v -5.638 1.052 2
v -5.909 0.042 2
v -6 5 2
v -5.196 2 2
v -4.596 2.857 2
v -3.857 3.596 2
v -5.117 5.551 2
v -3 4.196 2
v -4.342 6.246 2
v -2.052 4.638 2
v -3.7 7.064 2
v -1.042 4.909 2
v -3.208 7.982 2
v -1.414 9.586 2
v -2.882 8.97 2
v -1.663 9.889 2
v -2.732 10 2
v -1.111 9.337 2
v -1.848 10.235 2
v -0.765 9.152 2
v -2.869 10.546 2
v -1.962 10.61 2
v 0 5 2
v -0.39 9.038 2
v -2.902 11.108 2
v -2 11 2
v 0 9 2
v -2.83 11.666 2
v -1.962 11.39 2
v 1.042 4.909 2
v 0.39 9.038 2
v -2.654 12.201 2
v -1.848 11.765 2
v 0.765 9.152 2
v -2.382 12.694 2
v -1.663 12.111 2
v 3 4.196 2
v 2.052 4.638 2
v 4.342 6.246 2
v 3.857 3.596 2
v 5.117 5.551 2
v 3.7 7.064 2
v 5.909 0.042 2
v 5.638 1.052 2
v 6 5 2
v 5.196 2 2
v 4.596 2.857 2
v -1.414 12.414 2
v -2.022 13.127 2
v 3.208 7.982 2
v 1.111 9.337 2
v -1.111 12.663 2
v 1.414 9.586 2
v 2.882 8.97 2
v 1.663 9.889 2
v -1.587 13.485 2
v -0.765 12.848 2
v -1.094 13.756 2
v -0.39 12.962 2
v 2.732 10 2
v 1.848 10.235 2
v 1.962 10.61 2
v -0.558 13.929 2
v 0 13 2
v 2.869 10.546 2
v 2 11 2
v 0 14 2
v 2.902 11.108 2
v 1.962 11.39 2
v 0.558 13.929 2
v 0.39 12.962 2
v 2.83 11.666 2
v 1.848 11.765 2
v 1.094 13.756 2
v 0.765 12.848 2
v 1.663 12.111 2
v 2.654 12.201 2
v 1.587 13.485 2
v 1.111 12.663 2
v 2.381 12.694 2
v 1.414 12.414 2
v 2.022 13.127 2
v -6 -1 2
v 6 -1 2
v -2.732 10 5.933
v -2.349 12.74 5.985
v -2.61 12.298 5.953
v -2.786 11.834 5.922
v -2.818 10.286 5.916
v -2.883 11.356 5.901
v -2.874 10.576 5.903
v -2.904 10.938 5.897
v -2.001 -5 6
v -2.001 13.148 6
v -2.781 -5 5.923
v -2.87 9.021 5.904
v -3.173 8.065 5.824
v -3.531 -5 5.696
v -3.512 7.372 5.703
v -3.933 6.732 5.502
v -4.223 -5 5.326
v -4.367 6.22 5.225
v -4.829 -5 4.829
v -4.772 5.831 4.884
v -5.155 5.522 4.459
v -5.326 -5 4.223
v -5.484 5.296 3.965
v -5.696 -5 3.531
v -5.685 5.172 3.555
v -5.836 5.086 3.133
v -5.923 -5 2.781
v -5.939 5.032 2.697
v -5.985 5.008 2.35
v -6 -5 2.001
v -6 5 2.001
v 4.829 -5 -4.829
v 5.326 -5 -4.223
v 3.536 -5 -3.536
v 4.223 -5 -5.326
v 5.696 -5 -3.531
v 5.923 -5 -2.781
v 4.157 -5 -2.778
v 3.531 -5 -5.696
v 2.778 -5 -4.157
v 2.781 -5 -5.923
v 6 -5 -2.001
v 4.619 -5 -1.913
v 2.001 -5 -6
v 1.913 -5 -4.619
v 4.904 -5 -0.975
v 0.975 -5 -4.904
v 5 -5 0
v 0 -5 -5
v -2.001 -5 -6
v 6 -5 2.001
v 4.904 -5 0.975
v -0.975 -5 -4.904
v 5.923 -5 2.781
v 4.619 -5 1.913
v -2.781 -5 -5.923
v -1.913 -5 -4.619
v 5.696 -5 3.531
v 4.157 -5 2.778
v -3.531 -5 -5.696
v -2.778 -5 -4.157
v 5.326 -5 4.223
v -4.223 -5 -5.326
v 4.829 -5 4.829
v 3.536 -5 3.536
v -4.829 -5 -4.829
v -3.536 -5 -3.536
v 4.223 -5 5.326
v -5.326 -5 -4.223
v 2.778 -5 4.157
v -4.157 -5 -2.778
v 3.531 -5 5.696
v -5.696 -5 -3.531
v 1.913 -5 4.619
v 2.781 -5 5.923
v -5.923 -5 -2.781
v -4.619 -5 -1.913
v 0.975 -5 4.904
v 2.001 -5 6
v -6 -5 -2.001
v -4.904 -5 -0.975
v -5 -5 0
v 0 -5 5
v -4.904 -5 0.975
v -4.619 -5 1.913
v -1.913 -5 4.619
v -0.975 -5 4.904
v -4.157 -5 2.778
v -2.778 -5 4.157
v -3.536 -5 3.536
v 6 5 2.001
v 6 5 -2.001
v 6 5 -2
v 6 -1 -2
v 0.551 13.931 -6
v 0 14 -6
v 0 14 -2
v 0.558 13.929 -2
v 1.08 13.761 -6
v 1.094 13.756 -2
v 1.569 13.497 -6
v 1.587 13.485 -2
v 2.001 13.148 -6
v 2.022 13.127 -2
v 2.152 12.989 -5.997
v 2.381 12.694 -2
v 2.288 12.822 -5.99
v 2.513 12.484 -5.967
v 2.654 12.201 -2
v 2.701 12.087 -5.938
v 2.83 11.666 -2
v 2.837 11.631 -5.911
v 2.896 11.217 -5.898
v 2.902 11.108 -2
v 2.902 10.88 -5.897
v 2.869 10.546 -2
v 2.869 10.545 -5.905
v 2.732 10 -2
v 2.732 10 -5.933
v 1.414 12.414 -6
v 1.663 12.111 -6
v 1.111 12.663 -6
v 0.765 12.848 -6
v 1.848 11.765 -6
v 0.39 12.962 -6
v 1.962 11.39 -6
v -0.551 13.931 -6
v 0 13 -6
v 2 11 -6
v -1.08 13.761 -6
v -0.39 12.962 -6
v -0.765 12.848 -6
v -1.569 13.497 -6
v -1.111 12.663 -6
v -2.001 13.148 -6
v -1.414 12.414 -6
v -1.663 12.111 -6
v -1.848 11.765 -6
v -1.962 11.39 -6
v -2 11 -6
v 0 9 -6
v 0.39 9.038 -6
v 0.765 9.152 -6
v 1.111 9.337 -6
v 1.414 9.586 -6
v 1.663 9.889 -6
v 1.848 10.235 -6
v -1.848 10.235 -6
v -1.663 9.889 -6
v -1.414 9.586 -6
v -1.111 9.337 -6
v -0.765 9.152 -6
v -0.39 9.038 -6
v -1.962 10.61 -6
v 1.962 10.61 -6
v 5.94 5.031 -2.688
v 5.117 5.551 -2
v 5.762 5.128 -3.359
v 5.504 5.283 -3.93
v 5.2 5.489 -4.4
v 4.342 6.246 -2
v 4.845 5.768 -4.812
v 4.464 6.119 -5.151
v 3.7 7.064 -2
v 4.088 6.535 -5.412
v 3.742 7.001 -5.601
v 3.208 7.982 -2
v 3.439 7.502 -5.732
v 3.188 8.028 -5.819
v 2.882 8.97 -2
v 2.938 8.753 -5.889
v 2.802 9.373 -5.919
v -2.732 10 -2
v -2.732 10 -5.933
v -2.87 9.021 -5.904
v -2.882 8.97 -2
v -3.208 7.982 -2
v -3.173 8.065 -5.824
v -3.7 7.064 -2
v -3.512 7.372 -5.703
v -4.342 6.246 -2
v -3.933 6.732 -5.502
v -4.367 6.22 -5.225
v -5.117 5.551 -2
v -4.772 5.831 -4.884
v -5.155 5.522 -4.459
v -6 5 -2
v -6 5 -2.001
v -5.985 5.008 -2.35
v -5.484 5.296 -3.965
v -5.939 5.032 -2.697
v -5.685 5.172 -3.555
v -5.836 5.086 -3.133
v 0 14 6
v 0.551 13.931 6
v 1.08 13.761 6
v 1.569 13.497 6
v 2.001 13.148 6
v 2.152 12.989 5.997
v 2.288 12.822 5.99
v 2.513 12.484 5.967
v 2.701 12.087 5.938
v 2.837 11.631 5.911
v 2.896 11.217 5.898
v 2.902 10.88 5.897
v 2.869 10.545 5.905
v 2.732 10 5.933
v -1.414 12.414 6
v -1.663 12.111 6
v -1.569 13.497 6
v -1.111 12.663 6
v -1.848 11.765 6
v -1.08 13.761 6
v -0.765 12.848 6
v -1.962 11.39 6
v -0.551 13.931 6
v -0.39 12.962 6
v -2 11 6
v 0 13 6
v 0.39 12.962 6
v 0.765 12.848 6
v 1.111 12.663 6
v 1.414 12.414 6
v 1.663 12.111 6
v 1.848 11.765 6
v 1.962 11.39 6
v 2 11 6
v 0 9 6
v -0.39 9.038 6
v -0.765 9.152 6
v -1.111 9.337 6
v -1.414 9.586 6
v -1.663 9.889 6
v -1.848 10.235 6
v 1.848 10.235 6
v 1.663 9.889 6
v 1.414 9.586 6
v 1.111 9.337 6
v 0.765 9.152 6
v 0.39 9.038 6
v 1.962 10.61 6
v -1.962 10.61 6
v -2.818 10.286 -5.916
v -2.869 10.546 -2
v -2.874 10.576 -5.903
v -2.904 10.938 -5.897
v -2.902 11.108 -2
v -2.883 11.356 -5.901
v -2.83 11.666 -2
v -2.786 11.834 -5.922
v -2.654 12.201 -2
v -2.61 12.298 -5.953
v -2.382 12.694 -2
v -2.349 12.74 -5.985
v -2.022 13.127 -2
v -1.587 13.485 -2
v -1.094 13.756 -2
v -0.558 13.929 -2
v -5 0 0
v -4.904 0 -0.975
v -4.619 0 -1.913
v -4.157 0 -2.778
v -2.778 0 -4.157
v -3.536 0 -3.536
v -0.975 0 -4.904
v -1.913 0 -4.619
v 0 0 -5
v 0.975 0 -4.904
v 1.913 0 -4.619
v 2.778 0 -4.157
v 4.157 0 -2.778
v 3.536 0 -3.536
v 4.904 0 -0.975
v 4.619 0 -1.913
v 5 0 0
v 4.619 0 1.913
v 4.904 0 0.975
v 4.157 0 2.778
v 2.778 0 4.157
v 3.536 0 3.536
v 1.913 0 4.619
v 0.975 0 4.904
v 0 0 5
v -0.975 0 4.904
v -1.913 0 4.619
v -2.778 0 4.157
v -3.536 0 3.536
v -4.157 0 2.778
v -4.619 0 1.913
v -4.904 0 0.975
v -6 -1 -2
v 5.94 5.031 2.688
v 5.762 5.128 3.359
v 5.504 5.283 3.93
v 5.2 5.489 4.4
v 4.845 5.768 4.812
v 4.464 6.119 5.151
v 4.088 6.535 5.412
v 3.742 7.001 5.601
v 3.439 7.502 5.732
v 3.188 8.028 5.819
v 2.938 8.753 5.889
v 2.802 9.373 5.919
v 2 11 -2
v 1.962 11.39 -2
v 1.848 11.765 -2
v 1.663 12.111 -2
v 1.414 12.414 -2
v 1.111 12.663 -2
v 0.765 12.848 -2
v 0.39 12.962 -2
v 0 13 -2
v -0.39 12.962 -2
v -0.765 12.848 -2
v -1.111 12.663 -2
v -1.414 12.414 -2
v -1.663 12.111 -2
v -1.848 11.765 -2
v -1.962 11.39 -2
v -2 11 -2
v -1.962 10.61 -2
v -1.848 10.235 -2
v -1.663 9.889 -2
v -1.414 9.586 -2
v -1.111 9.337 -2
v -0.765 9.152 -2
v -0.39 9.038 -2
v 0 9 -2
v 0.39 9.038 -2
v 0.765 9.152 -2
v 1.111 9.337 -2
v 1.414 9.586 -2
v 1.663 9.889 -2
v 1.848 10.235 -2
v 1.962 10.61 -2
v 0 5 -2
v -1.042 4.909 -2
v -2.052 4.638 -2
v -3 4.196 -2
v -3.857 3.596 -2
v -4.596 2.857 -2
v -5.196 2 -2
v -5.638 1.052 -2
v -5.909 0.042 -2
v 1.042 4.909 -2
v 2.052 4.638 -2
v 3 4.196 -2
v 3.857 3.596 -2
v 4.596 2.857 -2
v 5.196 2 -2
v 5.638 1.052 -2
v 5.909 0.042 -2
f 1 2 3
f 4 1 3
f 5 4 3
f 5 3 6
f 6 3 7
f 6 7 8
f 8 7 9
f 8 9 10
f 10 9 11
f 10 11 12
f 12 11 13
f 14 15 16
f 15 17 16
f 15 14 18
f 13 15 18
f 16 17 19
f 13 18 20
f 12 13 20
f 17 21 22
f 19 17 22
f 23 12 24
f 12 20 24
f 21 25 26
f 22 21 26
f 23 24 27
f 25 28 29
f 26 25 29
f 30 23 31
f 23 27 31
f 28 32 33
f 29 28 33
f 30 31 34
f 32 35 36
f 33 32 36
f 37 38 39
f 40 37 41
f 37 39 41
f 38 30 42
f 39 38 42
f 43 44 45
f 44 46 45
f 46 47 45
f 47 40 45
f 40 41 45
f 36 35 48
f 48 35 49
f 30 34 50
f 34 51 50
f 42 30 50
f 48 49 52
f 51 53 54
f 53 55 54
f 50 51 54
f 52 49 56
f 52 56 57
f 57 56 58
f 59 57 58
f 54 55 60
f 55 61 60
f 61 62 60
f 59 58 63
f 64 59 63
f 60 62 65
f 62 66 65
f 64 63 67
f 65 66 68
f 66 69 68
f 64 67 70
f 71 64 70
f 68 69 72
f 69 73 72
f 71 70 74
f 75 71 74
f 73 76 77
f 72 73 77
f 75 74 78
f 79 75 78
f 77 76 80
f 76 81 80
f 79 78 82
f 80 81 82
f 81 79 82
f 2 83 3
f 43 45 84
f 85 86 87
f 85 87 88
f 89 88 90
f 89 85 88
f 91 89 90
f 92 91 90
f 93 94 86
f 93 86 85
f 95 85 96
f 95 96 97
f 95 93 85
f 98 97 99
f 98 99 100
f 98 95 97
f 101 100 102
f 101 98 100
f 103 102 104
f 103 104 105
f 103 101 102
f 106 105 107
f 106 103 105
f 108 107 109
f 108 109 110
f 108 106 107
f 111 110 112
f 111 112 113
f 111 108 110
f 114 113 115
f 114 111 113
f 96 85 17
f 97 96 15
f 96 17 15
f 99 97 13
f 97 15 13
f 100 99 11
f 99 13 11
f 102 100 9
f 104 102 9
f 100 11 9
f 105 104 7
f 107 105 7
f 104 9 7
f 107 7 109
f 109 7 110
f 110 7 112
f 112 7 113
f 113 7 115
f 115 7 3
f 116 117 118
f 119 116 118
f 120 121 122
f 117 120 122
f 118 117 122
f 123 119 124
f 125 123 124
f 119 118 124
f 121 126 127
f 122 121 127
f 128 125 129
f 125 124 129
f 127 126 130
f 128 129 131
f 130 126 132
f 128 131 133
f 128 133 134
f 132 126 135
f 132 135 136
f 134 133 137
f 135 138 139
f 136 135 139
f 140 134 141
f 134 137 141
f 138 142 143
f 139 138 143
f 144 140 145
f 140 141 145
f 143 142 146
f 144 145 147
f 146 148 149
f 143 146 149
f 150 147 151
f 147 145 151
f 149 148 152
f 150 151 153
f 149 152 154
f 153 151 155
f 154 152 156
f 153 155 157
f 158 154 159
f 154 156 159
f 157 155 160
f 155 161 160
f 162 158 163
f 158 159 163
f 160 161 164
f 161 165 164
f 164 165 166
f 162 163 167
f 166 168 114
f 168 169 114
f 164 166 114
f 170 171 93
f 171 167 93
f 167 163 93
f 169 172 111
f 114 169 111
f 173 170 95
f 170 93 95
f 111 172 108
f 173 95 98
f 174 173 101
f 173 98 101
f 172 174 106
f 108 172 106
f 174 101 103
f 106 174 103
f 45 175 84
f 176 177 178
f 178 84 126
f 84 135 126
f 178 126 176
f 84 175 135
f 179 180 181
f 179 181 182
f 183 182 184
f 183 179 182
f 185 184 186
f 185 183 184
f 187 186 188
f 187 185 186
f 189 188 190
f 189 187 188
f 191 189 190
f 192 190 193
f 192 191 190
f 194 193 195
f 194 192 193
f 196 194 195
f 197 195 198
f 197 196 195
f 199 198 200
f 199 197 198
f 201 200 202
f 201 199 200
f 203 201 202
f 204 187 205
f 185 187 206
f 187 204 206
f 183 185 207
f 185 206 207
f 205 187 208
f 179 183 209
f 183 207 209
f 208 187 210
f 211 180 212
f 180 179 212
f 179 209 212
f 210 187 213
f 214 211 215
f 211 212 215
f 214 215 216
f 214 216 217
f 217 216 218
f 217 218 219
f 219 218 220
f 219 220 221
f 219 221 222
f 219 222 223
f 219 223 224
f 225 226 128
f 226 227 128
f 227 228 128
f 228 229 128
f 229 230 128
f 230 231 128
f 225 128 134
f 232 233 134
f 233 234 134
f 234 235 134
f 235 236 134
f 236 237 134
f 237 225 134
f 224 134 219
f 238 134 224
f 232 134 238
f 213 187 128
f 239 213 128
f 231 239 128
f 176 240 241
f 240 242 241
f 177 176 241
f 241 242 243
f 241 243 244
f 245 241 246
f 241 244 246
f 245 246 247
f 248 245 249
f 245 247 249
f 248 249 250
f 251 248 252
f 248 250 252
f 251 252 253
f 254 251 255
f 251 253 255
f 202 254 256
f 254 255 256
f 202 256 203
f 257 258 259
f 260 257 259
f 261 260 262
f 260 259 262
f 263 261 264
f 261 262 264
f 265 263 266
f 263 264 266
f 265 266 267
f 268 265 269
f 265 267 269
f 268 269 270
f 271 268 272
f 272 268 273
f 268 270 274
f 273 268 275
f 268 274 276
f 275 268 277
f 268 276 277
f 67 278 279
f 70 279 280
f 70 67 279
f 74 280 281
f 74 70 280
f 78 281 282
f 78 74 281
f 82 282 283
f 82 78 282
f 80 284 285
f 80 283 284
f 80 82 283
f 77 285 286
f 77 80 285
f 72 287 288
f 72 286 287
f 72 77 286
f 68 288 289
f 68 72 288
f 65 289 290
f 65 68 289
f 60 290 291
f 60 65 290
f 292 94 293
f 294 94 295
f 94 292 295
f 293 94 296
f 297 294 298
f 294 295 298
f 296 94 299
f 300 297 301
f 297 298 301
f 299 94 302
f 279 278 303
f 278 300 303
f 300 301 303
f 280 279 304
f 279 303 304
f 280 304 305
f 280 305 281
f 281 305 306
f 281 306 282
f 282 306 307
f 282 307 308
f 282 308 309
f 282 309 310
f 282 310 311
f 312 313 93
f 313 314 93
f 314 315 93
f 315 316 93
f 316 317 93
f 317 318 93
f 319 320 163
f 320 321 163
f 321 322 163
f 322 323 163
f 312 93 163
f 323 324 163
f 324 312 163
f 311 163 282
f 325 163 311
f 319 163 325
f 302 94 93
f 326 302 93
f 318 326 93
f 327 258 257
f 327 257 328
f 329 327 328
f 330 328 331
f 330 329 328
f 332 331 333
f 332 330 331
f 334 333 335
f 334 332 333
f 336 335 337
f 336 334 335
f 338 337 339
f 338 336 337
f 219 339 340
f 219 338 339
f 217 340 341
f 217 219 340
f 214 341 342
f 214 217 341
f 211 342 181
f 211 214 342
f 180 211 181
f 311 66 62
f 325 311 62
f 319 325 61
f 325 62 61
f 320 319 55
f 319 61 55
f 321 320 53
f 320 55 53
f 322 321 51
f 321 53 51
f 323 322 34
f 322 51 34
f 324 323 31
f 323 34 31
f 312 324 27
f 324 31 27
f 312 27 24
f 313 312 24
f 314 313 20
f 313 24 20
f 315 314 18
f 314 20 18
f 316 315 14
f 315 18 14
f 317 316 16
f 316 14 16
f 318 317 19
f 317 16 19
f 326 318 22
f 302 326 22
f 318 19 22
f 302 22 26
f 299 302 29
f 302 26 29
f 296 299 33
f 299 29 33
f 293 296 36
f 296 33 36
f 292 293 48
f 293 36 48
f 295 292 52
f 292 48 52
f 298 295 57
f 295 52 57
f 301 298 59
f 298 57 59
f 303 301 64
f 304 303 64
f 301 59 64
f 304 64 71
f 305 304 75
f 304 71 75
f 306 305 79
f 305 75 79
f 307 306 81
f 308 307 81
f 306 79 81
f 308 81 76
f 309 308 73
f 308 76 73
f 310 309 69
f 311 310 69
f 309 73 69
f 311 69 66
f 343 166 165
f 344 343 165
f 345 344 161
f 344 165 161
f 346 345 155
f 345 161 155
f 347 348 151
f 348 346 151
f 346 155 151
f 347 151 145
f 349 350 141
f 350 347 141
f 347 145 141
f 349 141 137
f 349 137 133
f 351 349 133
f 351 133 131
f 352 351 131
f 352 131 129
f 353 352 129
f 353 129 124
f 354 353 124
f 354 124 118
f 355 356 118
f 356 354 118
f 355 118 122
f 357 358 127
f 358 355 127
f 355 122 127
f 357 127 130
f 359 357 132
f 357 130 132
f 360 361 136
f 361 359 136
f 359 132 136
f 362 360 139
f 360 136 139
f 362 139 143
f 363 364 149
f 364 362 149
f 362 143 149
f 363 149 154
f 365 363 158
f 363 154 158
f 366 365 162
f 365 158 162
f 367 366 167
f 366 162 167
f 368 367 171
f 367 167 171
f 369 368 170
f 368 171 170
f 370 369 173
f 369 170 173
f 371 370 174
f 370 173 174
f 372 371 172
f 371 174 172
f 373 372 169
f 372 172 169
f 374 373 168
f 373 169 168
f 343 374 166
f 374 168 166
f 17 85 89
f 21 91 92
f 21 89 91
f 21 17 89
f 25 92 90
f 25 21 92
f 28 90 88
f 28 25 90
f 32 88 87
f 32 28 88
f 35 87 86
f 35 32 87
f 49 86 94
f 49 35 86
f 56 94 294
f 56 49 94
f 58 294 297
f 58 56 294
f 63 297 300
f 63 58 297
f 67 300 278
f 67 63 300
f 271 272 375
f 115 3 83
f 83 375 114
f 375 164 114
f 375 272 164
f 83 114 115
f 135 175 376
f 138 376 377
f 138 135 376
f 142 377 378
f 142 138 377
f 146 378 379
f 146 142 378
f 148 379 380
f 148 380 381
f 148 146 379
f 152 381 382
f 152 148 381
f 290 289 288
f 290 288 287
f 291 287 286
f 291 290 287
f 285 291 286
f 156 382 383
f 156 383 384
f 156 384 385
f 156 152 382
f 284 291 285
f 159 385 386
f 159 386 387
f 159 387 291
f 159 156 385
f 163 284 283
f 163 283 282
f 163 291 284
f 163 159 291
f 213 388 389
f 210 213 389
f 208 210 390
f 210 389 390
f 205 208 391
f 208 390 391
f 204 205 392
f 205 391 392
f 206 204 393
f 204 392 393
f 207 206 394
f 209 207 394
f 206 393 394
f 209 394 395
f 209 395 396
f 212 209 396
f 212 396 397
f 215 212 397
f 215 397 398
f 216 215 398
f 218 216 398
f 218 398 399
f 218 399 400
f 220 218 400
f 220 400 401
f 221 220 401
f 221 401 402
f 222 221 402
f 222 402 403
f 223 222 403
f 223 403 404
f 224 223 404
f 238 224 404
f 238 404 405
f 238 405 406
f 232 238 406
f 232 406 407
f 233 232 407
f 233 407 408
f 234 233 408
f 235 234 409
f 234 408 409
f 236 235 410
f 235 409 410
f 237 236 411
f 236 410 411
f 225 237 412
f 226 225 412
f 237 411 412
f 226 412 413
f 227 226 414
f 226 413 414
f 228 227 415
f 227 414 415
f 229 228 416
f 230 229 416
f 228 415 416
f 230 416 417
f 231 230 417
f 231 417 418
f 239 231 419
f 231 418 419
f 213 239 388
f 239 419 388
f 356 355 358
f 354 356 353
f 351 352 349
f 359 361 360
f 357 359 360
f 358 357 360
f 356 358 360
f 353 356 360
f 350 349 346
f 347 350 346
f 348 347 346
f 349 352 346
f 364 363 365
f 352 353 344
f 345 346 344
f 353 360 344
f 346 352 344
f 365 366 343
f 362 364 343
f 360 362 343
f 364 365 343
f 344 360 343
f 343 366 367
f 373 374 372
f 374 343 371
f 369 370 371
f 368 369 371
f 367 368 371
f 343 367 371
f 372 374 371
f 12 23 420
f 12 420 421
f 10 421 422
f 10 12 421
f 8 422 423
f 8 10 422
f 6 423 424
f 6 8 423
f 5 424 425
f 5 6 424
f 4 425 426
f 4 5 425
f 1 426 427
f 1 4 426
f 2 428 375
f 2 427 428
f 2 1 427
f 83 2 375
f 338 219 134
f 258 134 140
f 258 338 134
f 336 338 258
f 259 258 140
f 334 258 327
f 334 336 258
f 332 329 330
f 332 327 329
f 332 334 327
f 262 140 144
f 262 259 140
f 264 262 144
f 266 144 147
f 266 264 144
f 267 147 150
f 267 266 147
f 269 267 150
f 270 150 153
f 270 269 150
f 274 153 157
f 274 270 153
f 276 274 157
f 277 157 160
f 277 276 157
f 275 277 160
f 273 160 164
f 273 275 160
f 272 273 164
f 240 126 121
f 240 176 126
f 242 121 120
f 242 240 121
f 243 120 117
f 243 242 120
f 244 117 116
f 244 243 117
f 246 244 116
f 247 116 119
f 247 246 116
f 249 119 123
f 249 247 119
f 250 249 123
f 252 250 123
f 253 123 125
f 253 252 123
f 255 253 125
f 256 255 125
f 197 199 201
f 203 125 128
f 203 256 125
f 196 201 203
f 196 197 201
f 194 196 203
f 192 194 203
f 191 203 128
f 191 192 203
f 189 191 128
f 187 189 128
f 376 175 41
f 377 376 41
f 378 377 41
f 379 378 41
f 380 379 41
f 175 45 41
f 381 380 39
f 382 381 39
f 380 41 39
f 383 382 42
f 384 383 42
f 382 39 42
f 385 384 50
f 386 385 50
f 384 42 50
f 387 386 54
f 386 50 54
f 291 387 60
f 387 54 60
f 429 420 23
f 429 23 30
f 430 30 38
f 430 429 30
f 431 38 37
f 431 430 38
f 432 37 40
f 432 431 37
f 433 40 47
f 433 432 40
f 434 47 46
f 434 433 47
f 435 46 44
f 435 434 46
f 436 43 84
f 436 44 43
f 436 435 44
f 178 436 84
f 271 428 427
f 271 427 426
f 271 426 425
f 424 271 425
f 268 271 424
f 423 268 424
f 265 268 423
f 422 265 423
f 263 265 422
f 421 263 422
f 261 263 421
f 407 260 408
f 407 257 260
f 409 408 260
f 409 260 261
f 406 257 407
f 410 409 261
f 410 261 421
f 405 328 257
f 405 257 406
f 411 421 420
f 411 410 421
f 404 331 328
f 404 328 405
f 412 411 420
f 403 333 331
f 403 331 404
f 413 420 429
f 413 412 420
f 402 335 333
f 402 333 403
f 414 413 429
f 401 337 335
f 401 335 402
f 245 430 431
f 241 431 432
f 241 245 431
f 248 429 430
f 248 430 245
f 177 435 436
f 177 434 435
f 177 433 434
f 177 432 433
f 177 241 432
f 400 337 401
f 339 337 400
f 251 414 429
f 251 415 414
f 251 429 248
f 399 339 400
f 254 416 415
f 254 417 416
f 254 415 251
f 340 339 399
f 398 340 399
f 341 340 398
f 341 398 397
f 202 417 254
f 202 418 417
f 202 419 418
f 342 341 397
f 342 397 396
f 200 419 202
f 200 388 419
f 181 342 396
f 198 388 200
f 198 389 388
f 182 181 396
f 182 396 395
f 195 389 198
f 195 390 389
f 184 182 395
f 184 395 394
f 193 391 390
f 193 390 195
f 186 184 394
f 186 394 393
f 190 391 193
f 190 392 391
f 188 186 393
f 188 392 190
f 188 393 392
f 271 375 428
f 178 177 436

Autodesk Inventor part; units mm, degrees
ref_plane "YZ Plane" through (0, 0, 0) normal (1, 0, 0) x (0, 1, 0)
ref_plane "XZ Plane" through (0, 0, 0) normal (0, 1, 0) x (-1, 0, 0)
sketch "Szkic3" plane through (0, 0, 0) normal (0, 1, 0) x (-1, 0, 0)
  circle A0 centre (0, 0) radius 5
  line L0 (-6, -6) -> (6, -6)
  line L1 (6, -6) -> (6, 6)
  line L2 (6, 6) -> (-6, 6)
  line L3 (-6, 6) -> (-6, -6)
  line L4 (-6, -6) -> (6, 6) construction
  line L5 (6, -6) -> (-6, 6) construction
  dimension "d12" = 10
  dimension "d15" = 12
  dimension "d16" = 12
extrude "Wyciągnięcie proste3" add sketch "Szkic3" along normal mid plane 10
extrude "Wyciągnięcie proste4" add sketch "Szkic3" along normal blind 5 contours A0
ref_plane "Płaszczyzna konstrukcyjna2" through (-6, 5, 0) normal (0, 0, 1) x (1, 0, 0)
sketch "Szkic7" plane through (-6, 5, 0) normal (0, 0, 1) x (1, 0, 0)
  line L0 (0, 0) -> (12, 0) projected
  line L1 (0, 0) -> (12, 0)
  line L2 (6, 0) -> (6, 6)
  line L3 (6, 0) -> (12, 0) construction
  circle A0 centre (6, 6) radius 2
  line L4 (4.2679, 5) -> (3.2679, 5)
  line L5 (6, 8) -> (6, 9)
  line L6 (7.7321, 5) -> (8.7321, 5)
  arc A1 (0, 0) -> (3.2679, 5) centre (-2.722, 5.347) ccw
  arc A2 (6, 9) -> (3.2679, 5) centre (6.0958, 6.0015) ccw
  arc A3 (8.7321, 5) -> (6, 9) centre (5.9042, 6.0015) ccw
  arc A4 (8.7321, 5) -> (12, 0) centre (14.722, 5.347) ccw
  point P0 (6, -5)
  dimension "d42" = 6
  dimension "d43" = 90
  dimension "d44" = 4
  dimension "d45" = 1
  dimension "d46" = 1
  dimension "d47" = 1
  dimension "d48" = 5
  dimension "d49" = 5
  dimension "d50" = 0
  dimension "d51" = 6
  dimension "d52" = 3
  dimension "d53" = 3
  dimension "d54" = 6
extrude "Wyciągnięcie proste7" add sketch "Szkic7" along normal mid plane 12 contours A1 L4 A0 L2 L0 | L2 A0 L6 A4 L0 | A2 L5 A0 L4 | A3 L6 A0 L5
sketch "Szkic8" plane through (-6, 5, 0) normal (0, 0, 1) x (1, 0, 0)
  arc A0 (8.7321, 5) -> (12, 0) centre (14.722, 5.347) ccw projected
  line L0 (0, 12) -> (12, 12)
  line L1 (12, 12) -> (12, 0)
  line L2 (12, 0) -> (0, 0)
  line L3 (0, 0) -> (0, 12)
  circle A1 centre (6, 6) radius 2 projected
  line L4 (0, 12) -> (12, 0) construction
  line L5 (12, 12) -> (0, 0) construction
  point P0 (6, -5)
extrude "Wyciągnięcie proste8" cut sketch "Szkic8" along normal mid plane 4
fillet "Zaokrąglenie5" radius 6 2 edges at (6, 5, 0) (-6, 5, 0)
fillet "Zaokrąglenie6" radius 4 4 edges at (6, 0, 6) (6, 0, -6) (-6, 0, -6) (-6, 0, 6)
properties part number "Connector_hollow"
